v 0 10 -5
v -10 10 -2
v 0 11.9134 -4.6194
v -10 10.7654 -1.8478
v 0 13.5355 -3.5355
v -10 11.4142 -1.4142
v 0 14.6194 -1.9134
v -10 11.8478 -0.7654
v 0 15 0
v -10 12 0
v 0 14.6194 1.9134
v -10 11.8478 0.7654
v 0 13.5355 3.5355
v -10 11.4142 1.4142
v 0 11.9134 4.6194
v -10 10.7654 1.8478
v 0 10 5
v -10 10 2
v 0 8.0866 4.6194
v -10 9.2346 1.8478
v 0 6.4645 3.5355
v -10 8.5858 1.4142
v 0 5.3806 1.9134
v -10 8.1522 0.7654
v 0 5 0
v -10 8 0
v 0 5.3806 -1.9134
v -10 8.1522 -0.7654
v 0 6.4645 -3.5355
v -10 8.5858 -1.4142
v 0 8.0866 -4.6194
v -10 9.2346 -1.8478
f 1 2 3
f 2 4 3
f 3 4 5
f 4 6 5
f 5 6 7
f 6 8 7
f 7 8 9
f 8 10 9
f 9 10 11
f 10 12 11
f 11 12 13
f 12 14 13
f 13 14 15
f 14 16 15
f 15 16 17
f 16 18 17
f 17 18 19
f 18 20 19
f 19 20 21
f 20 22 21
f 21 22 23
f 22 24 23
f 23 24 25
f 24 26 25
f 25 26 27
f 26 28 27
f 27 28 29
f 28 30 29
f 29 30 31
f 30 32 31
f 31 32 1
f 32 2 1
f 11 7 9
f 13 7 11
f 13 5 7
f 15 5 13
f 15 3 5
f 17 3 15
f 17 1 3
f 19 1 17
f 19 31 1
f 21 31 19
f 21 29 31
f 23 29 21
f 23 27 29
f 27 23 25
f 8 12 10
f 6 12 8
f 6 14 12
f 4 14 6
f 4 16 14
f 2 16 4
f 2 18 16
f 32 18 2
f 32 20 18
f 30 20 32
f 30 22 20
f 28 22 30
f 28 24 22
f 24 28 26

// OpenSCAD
mirror([10, 0, 0])
	translate([0, 10, 0])
		rotate([0, 90, 0])
			cylinder(h=10, r1=5, r2=2);
